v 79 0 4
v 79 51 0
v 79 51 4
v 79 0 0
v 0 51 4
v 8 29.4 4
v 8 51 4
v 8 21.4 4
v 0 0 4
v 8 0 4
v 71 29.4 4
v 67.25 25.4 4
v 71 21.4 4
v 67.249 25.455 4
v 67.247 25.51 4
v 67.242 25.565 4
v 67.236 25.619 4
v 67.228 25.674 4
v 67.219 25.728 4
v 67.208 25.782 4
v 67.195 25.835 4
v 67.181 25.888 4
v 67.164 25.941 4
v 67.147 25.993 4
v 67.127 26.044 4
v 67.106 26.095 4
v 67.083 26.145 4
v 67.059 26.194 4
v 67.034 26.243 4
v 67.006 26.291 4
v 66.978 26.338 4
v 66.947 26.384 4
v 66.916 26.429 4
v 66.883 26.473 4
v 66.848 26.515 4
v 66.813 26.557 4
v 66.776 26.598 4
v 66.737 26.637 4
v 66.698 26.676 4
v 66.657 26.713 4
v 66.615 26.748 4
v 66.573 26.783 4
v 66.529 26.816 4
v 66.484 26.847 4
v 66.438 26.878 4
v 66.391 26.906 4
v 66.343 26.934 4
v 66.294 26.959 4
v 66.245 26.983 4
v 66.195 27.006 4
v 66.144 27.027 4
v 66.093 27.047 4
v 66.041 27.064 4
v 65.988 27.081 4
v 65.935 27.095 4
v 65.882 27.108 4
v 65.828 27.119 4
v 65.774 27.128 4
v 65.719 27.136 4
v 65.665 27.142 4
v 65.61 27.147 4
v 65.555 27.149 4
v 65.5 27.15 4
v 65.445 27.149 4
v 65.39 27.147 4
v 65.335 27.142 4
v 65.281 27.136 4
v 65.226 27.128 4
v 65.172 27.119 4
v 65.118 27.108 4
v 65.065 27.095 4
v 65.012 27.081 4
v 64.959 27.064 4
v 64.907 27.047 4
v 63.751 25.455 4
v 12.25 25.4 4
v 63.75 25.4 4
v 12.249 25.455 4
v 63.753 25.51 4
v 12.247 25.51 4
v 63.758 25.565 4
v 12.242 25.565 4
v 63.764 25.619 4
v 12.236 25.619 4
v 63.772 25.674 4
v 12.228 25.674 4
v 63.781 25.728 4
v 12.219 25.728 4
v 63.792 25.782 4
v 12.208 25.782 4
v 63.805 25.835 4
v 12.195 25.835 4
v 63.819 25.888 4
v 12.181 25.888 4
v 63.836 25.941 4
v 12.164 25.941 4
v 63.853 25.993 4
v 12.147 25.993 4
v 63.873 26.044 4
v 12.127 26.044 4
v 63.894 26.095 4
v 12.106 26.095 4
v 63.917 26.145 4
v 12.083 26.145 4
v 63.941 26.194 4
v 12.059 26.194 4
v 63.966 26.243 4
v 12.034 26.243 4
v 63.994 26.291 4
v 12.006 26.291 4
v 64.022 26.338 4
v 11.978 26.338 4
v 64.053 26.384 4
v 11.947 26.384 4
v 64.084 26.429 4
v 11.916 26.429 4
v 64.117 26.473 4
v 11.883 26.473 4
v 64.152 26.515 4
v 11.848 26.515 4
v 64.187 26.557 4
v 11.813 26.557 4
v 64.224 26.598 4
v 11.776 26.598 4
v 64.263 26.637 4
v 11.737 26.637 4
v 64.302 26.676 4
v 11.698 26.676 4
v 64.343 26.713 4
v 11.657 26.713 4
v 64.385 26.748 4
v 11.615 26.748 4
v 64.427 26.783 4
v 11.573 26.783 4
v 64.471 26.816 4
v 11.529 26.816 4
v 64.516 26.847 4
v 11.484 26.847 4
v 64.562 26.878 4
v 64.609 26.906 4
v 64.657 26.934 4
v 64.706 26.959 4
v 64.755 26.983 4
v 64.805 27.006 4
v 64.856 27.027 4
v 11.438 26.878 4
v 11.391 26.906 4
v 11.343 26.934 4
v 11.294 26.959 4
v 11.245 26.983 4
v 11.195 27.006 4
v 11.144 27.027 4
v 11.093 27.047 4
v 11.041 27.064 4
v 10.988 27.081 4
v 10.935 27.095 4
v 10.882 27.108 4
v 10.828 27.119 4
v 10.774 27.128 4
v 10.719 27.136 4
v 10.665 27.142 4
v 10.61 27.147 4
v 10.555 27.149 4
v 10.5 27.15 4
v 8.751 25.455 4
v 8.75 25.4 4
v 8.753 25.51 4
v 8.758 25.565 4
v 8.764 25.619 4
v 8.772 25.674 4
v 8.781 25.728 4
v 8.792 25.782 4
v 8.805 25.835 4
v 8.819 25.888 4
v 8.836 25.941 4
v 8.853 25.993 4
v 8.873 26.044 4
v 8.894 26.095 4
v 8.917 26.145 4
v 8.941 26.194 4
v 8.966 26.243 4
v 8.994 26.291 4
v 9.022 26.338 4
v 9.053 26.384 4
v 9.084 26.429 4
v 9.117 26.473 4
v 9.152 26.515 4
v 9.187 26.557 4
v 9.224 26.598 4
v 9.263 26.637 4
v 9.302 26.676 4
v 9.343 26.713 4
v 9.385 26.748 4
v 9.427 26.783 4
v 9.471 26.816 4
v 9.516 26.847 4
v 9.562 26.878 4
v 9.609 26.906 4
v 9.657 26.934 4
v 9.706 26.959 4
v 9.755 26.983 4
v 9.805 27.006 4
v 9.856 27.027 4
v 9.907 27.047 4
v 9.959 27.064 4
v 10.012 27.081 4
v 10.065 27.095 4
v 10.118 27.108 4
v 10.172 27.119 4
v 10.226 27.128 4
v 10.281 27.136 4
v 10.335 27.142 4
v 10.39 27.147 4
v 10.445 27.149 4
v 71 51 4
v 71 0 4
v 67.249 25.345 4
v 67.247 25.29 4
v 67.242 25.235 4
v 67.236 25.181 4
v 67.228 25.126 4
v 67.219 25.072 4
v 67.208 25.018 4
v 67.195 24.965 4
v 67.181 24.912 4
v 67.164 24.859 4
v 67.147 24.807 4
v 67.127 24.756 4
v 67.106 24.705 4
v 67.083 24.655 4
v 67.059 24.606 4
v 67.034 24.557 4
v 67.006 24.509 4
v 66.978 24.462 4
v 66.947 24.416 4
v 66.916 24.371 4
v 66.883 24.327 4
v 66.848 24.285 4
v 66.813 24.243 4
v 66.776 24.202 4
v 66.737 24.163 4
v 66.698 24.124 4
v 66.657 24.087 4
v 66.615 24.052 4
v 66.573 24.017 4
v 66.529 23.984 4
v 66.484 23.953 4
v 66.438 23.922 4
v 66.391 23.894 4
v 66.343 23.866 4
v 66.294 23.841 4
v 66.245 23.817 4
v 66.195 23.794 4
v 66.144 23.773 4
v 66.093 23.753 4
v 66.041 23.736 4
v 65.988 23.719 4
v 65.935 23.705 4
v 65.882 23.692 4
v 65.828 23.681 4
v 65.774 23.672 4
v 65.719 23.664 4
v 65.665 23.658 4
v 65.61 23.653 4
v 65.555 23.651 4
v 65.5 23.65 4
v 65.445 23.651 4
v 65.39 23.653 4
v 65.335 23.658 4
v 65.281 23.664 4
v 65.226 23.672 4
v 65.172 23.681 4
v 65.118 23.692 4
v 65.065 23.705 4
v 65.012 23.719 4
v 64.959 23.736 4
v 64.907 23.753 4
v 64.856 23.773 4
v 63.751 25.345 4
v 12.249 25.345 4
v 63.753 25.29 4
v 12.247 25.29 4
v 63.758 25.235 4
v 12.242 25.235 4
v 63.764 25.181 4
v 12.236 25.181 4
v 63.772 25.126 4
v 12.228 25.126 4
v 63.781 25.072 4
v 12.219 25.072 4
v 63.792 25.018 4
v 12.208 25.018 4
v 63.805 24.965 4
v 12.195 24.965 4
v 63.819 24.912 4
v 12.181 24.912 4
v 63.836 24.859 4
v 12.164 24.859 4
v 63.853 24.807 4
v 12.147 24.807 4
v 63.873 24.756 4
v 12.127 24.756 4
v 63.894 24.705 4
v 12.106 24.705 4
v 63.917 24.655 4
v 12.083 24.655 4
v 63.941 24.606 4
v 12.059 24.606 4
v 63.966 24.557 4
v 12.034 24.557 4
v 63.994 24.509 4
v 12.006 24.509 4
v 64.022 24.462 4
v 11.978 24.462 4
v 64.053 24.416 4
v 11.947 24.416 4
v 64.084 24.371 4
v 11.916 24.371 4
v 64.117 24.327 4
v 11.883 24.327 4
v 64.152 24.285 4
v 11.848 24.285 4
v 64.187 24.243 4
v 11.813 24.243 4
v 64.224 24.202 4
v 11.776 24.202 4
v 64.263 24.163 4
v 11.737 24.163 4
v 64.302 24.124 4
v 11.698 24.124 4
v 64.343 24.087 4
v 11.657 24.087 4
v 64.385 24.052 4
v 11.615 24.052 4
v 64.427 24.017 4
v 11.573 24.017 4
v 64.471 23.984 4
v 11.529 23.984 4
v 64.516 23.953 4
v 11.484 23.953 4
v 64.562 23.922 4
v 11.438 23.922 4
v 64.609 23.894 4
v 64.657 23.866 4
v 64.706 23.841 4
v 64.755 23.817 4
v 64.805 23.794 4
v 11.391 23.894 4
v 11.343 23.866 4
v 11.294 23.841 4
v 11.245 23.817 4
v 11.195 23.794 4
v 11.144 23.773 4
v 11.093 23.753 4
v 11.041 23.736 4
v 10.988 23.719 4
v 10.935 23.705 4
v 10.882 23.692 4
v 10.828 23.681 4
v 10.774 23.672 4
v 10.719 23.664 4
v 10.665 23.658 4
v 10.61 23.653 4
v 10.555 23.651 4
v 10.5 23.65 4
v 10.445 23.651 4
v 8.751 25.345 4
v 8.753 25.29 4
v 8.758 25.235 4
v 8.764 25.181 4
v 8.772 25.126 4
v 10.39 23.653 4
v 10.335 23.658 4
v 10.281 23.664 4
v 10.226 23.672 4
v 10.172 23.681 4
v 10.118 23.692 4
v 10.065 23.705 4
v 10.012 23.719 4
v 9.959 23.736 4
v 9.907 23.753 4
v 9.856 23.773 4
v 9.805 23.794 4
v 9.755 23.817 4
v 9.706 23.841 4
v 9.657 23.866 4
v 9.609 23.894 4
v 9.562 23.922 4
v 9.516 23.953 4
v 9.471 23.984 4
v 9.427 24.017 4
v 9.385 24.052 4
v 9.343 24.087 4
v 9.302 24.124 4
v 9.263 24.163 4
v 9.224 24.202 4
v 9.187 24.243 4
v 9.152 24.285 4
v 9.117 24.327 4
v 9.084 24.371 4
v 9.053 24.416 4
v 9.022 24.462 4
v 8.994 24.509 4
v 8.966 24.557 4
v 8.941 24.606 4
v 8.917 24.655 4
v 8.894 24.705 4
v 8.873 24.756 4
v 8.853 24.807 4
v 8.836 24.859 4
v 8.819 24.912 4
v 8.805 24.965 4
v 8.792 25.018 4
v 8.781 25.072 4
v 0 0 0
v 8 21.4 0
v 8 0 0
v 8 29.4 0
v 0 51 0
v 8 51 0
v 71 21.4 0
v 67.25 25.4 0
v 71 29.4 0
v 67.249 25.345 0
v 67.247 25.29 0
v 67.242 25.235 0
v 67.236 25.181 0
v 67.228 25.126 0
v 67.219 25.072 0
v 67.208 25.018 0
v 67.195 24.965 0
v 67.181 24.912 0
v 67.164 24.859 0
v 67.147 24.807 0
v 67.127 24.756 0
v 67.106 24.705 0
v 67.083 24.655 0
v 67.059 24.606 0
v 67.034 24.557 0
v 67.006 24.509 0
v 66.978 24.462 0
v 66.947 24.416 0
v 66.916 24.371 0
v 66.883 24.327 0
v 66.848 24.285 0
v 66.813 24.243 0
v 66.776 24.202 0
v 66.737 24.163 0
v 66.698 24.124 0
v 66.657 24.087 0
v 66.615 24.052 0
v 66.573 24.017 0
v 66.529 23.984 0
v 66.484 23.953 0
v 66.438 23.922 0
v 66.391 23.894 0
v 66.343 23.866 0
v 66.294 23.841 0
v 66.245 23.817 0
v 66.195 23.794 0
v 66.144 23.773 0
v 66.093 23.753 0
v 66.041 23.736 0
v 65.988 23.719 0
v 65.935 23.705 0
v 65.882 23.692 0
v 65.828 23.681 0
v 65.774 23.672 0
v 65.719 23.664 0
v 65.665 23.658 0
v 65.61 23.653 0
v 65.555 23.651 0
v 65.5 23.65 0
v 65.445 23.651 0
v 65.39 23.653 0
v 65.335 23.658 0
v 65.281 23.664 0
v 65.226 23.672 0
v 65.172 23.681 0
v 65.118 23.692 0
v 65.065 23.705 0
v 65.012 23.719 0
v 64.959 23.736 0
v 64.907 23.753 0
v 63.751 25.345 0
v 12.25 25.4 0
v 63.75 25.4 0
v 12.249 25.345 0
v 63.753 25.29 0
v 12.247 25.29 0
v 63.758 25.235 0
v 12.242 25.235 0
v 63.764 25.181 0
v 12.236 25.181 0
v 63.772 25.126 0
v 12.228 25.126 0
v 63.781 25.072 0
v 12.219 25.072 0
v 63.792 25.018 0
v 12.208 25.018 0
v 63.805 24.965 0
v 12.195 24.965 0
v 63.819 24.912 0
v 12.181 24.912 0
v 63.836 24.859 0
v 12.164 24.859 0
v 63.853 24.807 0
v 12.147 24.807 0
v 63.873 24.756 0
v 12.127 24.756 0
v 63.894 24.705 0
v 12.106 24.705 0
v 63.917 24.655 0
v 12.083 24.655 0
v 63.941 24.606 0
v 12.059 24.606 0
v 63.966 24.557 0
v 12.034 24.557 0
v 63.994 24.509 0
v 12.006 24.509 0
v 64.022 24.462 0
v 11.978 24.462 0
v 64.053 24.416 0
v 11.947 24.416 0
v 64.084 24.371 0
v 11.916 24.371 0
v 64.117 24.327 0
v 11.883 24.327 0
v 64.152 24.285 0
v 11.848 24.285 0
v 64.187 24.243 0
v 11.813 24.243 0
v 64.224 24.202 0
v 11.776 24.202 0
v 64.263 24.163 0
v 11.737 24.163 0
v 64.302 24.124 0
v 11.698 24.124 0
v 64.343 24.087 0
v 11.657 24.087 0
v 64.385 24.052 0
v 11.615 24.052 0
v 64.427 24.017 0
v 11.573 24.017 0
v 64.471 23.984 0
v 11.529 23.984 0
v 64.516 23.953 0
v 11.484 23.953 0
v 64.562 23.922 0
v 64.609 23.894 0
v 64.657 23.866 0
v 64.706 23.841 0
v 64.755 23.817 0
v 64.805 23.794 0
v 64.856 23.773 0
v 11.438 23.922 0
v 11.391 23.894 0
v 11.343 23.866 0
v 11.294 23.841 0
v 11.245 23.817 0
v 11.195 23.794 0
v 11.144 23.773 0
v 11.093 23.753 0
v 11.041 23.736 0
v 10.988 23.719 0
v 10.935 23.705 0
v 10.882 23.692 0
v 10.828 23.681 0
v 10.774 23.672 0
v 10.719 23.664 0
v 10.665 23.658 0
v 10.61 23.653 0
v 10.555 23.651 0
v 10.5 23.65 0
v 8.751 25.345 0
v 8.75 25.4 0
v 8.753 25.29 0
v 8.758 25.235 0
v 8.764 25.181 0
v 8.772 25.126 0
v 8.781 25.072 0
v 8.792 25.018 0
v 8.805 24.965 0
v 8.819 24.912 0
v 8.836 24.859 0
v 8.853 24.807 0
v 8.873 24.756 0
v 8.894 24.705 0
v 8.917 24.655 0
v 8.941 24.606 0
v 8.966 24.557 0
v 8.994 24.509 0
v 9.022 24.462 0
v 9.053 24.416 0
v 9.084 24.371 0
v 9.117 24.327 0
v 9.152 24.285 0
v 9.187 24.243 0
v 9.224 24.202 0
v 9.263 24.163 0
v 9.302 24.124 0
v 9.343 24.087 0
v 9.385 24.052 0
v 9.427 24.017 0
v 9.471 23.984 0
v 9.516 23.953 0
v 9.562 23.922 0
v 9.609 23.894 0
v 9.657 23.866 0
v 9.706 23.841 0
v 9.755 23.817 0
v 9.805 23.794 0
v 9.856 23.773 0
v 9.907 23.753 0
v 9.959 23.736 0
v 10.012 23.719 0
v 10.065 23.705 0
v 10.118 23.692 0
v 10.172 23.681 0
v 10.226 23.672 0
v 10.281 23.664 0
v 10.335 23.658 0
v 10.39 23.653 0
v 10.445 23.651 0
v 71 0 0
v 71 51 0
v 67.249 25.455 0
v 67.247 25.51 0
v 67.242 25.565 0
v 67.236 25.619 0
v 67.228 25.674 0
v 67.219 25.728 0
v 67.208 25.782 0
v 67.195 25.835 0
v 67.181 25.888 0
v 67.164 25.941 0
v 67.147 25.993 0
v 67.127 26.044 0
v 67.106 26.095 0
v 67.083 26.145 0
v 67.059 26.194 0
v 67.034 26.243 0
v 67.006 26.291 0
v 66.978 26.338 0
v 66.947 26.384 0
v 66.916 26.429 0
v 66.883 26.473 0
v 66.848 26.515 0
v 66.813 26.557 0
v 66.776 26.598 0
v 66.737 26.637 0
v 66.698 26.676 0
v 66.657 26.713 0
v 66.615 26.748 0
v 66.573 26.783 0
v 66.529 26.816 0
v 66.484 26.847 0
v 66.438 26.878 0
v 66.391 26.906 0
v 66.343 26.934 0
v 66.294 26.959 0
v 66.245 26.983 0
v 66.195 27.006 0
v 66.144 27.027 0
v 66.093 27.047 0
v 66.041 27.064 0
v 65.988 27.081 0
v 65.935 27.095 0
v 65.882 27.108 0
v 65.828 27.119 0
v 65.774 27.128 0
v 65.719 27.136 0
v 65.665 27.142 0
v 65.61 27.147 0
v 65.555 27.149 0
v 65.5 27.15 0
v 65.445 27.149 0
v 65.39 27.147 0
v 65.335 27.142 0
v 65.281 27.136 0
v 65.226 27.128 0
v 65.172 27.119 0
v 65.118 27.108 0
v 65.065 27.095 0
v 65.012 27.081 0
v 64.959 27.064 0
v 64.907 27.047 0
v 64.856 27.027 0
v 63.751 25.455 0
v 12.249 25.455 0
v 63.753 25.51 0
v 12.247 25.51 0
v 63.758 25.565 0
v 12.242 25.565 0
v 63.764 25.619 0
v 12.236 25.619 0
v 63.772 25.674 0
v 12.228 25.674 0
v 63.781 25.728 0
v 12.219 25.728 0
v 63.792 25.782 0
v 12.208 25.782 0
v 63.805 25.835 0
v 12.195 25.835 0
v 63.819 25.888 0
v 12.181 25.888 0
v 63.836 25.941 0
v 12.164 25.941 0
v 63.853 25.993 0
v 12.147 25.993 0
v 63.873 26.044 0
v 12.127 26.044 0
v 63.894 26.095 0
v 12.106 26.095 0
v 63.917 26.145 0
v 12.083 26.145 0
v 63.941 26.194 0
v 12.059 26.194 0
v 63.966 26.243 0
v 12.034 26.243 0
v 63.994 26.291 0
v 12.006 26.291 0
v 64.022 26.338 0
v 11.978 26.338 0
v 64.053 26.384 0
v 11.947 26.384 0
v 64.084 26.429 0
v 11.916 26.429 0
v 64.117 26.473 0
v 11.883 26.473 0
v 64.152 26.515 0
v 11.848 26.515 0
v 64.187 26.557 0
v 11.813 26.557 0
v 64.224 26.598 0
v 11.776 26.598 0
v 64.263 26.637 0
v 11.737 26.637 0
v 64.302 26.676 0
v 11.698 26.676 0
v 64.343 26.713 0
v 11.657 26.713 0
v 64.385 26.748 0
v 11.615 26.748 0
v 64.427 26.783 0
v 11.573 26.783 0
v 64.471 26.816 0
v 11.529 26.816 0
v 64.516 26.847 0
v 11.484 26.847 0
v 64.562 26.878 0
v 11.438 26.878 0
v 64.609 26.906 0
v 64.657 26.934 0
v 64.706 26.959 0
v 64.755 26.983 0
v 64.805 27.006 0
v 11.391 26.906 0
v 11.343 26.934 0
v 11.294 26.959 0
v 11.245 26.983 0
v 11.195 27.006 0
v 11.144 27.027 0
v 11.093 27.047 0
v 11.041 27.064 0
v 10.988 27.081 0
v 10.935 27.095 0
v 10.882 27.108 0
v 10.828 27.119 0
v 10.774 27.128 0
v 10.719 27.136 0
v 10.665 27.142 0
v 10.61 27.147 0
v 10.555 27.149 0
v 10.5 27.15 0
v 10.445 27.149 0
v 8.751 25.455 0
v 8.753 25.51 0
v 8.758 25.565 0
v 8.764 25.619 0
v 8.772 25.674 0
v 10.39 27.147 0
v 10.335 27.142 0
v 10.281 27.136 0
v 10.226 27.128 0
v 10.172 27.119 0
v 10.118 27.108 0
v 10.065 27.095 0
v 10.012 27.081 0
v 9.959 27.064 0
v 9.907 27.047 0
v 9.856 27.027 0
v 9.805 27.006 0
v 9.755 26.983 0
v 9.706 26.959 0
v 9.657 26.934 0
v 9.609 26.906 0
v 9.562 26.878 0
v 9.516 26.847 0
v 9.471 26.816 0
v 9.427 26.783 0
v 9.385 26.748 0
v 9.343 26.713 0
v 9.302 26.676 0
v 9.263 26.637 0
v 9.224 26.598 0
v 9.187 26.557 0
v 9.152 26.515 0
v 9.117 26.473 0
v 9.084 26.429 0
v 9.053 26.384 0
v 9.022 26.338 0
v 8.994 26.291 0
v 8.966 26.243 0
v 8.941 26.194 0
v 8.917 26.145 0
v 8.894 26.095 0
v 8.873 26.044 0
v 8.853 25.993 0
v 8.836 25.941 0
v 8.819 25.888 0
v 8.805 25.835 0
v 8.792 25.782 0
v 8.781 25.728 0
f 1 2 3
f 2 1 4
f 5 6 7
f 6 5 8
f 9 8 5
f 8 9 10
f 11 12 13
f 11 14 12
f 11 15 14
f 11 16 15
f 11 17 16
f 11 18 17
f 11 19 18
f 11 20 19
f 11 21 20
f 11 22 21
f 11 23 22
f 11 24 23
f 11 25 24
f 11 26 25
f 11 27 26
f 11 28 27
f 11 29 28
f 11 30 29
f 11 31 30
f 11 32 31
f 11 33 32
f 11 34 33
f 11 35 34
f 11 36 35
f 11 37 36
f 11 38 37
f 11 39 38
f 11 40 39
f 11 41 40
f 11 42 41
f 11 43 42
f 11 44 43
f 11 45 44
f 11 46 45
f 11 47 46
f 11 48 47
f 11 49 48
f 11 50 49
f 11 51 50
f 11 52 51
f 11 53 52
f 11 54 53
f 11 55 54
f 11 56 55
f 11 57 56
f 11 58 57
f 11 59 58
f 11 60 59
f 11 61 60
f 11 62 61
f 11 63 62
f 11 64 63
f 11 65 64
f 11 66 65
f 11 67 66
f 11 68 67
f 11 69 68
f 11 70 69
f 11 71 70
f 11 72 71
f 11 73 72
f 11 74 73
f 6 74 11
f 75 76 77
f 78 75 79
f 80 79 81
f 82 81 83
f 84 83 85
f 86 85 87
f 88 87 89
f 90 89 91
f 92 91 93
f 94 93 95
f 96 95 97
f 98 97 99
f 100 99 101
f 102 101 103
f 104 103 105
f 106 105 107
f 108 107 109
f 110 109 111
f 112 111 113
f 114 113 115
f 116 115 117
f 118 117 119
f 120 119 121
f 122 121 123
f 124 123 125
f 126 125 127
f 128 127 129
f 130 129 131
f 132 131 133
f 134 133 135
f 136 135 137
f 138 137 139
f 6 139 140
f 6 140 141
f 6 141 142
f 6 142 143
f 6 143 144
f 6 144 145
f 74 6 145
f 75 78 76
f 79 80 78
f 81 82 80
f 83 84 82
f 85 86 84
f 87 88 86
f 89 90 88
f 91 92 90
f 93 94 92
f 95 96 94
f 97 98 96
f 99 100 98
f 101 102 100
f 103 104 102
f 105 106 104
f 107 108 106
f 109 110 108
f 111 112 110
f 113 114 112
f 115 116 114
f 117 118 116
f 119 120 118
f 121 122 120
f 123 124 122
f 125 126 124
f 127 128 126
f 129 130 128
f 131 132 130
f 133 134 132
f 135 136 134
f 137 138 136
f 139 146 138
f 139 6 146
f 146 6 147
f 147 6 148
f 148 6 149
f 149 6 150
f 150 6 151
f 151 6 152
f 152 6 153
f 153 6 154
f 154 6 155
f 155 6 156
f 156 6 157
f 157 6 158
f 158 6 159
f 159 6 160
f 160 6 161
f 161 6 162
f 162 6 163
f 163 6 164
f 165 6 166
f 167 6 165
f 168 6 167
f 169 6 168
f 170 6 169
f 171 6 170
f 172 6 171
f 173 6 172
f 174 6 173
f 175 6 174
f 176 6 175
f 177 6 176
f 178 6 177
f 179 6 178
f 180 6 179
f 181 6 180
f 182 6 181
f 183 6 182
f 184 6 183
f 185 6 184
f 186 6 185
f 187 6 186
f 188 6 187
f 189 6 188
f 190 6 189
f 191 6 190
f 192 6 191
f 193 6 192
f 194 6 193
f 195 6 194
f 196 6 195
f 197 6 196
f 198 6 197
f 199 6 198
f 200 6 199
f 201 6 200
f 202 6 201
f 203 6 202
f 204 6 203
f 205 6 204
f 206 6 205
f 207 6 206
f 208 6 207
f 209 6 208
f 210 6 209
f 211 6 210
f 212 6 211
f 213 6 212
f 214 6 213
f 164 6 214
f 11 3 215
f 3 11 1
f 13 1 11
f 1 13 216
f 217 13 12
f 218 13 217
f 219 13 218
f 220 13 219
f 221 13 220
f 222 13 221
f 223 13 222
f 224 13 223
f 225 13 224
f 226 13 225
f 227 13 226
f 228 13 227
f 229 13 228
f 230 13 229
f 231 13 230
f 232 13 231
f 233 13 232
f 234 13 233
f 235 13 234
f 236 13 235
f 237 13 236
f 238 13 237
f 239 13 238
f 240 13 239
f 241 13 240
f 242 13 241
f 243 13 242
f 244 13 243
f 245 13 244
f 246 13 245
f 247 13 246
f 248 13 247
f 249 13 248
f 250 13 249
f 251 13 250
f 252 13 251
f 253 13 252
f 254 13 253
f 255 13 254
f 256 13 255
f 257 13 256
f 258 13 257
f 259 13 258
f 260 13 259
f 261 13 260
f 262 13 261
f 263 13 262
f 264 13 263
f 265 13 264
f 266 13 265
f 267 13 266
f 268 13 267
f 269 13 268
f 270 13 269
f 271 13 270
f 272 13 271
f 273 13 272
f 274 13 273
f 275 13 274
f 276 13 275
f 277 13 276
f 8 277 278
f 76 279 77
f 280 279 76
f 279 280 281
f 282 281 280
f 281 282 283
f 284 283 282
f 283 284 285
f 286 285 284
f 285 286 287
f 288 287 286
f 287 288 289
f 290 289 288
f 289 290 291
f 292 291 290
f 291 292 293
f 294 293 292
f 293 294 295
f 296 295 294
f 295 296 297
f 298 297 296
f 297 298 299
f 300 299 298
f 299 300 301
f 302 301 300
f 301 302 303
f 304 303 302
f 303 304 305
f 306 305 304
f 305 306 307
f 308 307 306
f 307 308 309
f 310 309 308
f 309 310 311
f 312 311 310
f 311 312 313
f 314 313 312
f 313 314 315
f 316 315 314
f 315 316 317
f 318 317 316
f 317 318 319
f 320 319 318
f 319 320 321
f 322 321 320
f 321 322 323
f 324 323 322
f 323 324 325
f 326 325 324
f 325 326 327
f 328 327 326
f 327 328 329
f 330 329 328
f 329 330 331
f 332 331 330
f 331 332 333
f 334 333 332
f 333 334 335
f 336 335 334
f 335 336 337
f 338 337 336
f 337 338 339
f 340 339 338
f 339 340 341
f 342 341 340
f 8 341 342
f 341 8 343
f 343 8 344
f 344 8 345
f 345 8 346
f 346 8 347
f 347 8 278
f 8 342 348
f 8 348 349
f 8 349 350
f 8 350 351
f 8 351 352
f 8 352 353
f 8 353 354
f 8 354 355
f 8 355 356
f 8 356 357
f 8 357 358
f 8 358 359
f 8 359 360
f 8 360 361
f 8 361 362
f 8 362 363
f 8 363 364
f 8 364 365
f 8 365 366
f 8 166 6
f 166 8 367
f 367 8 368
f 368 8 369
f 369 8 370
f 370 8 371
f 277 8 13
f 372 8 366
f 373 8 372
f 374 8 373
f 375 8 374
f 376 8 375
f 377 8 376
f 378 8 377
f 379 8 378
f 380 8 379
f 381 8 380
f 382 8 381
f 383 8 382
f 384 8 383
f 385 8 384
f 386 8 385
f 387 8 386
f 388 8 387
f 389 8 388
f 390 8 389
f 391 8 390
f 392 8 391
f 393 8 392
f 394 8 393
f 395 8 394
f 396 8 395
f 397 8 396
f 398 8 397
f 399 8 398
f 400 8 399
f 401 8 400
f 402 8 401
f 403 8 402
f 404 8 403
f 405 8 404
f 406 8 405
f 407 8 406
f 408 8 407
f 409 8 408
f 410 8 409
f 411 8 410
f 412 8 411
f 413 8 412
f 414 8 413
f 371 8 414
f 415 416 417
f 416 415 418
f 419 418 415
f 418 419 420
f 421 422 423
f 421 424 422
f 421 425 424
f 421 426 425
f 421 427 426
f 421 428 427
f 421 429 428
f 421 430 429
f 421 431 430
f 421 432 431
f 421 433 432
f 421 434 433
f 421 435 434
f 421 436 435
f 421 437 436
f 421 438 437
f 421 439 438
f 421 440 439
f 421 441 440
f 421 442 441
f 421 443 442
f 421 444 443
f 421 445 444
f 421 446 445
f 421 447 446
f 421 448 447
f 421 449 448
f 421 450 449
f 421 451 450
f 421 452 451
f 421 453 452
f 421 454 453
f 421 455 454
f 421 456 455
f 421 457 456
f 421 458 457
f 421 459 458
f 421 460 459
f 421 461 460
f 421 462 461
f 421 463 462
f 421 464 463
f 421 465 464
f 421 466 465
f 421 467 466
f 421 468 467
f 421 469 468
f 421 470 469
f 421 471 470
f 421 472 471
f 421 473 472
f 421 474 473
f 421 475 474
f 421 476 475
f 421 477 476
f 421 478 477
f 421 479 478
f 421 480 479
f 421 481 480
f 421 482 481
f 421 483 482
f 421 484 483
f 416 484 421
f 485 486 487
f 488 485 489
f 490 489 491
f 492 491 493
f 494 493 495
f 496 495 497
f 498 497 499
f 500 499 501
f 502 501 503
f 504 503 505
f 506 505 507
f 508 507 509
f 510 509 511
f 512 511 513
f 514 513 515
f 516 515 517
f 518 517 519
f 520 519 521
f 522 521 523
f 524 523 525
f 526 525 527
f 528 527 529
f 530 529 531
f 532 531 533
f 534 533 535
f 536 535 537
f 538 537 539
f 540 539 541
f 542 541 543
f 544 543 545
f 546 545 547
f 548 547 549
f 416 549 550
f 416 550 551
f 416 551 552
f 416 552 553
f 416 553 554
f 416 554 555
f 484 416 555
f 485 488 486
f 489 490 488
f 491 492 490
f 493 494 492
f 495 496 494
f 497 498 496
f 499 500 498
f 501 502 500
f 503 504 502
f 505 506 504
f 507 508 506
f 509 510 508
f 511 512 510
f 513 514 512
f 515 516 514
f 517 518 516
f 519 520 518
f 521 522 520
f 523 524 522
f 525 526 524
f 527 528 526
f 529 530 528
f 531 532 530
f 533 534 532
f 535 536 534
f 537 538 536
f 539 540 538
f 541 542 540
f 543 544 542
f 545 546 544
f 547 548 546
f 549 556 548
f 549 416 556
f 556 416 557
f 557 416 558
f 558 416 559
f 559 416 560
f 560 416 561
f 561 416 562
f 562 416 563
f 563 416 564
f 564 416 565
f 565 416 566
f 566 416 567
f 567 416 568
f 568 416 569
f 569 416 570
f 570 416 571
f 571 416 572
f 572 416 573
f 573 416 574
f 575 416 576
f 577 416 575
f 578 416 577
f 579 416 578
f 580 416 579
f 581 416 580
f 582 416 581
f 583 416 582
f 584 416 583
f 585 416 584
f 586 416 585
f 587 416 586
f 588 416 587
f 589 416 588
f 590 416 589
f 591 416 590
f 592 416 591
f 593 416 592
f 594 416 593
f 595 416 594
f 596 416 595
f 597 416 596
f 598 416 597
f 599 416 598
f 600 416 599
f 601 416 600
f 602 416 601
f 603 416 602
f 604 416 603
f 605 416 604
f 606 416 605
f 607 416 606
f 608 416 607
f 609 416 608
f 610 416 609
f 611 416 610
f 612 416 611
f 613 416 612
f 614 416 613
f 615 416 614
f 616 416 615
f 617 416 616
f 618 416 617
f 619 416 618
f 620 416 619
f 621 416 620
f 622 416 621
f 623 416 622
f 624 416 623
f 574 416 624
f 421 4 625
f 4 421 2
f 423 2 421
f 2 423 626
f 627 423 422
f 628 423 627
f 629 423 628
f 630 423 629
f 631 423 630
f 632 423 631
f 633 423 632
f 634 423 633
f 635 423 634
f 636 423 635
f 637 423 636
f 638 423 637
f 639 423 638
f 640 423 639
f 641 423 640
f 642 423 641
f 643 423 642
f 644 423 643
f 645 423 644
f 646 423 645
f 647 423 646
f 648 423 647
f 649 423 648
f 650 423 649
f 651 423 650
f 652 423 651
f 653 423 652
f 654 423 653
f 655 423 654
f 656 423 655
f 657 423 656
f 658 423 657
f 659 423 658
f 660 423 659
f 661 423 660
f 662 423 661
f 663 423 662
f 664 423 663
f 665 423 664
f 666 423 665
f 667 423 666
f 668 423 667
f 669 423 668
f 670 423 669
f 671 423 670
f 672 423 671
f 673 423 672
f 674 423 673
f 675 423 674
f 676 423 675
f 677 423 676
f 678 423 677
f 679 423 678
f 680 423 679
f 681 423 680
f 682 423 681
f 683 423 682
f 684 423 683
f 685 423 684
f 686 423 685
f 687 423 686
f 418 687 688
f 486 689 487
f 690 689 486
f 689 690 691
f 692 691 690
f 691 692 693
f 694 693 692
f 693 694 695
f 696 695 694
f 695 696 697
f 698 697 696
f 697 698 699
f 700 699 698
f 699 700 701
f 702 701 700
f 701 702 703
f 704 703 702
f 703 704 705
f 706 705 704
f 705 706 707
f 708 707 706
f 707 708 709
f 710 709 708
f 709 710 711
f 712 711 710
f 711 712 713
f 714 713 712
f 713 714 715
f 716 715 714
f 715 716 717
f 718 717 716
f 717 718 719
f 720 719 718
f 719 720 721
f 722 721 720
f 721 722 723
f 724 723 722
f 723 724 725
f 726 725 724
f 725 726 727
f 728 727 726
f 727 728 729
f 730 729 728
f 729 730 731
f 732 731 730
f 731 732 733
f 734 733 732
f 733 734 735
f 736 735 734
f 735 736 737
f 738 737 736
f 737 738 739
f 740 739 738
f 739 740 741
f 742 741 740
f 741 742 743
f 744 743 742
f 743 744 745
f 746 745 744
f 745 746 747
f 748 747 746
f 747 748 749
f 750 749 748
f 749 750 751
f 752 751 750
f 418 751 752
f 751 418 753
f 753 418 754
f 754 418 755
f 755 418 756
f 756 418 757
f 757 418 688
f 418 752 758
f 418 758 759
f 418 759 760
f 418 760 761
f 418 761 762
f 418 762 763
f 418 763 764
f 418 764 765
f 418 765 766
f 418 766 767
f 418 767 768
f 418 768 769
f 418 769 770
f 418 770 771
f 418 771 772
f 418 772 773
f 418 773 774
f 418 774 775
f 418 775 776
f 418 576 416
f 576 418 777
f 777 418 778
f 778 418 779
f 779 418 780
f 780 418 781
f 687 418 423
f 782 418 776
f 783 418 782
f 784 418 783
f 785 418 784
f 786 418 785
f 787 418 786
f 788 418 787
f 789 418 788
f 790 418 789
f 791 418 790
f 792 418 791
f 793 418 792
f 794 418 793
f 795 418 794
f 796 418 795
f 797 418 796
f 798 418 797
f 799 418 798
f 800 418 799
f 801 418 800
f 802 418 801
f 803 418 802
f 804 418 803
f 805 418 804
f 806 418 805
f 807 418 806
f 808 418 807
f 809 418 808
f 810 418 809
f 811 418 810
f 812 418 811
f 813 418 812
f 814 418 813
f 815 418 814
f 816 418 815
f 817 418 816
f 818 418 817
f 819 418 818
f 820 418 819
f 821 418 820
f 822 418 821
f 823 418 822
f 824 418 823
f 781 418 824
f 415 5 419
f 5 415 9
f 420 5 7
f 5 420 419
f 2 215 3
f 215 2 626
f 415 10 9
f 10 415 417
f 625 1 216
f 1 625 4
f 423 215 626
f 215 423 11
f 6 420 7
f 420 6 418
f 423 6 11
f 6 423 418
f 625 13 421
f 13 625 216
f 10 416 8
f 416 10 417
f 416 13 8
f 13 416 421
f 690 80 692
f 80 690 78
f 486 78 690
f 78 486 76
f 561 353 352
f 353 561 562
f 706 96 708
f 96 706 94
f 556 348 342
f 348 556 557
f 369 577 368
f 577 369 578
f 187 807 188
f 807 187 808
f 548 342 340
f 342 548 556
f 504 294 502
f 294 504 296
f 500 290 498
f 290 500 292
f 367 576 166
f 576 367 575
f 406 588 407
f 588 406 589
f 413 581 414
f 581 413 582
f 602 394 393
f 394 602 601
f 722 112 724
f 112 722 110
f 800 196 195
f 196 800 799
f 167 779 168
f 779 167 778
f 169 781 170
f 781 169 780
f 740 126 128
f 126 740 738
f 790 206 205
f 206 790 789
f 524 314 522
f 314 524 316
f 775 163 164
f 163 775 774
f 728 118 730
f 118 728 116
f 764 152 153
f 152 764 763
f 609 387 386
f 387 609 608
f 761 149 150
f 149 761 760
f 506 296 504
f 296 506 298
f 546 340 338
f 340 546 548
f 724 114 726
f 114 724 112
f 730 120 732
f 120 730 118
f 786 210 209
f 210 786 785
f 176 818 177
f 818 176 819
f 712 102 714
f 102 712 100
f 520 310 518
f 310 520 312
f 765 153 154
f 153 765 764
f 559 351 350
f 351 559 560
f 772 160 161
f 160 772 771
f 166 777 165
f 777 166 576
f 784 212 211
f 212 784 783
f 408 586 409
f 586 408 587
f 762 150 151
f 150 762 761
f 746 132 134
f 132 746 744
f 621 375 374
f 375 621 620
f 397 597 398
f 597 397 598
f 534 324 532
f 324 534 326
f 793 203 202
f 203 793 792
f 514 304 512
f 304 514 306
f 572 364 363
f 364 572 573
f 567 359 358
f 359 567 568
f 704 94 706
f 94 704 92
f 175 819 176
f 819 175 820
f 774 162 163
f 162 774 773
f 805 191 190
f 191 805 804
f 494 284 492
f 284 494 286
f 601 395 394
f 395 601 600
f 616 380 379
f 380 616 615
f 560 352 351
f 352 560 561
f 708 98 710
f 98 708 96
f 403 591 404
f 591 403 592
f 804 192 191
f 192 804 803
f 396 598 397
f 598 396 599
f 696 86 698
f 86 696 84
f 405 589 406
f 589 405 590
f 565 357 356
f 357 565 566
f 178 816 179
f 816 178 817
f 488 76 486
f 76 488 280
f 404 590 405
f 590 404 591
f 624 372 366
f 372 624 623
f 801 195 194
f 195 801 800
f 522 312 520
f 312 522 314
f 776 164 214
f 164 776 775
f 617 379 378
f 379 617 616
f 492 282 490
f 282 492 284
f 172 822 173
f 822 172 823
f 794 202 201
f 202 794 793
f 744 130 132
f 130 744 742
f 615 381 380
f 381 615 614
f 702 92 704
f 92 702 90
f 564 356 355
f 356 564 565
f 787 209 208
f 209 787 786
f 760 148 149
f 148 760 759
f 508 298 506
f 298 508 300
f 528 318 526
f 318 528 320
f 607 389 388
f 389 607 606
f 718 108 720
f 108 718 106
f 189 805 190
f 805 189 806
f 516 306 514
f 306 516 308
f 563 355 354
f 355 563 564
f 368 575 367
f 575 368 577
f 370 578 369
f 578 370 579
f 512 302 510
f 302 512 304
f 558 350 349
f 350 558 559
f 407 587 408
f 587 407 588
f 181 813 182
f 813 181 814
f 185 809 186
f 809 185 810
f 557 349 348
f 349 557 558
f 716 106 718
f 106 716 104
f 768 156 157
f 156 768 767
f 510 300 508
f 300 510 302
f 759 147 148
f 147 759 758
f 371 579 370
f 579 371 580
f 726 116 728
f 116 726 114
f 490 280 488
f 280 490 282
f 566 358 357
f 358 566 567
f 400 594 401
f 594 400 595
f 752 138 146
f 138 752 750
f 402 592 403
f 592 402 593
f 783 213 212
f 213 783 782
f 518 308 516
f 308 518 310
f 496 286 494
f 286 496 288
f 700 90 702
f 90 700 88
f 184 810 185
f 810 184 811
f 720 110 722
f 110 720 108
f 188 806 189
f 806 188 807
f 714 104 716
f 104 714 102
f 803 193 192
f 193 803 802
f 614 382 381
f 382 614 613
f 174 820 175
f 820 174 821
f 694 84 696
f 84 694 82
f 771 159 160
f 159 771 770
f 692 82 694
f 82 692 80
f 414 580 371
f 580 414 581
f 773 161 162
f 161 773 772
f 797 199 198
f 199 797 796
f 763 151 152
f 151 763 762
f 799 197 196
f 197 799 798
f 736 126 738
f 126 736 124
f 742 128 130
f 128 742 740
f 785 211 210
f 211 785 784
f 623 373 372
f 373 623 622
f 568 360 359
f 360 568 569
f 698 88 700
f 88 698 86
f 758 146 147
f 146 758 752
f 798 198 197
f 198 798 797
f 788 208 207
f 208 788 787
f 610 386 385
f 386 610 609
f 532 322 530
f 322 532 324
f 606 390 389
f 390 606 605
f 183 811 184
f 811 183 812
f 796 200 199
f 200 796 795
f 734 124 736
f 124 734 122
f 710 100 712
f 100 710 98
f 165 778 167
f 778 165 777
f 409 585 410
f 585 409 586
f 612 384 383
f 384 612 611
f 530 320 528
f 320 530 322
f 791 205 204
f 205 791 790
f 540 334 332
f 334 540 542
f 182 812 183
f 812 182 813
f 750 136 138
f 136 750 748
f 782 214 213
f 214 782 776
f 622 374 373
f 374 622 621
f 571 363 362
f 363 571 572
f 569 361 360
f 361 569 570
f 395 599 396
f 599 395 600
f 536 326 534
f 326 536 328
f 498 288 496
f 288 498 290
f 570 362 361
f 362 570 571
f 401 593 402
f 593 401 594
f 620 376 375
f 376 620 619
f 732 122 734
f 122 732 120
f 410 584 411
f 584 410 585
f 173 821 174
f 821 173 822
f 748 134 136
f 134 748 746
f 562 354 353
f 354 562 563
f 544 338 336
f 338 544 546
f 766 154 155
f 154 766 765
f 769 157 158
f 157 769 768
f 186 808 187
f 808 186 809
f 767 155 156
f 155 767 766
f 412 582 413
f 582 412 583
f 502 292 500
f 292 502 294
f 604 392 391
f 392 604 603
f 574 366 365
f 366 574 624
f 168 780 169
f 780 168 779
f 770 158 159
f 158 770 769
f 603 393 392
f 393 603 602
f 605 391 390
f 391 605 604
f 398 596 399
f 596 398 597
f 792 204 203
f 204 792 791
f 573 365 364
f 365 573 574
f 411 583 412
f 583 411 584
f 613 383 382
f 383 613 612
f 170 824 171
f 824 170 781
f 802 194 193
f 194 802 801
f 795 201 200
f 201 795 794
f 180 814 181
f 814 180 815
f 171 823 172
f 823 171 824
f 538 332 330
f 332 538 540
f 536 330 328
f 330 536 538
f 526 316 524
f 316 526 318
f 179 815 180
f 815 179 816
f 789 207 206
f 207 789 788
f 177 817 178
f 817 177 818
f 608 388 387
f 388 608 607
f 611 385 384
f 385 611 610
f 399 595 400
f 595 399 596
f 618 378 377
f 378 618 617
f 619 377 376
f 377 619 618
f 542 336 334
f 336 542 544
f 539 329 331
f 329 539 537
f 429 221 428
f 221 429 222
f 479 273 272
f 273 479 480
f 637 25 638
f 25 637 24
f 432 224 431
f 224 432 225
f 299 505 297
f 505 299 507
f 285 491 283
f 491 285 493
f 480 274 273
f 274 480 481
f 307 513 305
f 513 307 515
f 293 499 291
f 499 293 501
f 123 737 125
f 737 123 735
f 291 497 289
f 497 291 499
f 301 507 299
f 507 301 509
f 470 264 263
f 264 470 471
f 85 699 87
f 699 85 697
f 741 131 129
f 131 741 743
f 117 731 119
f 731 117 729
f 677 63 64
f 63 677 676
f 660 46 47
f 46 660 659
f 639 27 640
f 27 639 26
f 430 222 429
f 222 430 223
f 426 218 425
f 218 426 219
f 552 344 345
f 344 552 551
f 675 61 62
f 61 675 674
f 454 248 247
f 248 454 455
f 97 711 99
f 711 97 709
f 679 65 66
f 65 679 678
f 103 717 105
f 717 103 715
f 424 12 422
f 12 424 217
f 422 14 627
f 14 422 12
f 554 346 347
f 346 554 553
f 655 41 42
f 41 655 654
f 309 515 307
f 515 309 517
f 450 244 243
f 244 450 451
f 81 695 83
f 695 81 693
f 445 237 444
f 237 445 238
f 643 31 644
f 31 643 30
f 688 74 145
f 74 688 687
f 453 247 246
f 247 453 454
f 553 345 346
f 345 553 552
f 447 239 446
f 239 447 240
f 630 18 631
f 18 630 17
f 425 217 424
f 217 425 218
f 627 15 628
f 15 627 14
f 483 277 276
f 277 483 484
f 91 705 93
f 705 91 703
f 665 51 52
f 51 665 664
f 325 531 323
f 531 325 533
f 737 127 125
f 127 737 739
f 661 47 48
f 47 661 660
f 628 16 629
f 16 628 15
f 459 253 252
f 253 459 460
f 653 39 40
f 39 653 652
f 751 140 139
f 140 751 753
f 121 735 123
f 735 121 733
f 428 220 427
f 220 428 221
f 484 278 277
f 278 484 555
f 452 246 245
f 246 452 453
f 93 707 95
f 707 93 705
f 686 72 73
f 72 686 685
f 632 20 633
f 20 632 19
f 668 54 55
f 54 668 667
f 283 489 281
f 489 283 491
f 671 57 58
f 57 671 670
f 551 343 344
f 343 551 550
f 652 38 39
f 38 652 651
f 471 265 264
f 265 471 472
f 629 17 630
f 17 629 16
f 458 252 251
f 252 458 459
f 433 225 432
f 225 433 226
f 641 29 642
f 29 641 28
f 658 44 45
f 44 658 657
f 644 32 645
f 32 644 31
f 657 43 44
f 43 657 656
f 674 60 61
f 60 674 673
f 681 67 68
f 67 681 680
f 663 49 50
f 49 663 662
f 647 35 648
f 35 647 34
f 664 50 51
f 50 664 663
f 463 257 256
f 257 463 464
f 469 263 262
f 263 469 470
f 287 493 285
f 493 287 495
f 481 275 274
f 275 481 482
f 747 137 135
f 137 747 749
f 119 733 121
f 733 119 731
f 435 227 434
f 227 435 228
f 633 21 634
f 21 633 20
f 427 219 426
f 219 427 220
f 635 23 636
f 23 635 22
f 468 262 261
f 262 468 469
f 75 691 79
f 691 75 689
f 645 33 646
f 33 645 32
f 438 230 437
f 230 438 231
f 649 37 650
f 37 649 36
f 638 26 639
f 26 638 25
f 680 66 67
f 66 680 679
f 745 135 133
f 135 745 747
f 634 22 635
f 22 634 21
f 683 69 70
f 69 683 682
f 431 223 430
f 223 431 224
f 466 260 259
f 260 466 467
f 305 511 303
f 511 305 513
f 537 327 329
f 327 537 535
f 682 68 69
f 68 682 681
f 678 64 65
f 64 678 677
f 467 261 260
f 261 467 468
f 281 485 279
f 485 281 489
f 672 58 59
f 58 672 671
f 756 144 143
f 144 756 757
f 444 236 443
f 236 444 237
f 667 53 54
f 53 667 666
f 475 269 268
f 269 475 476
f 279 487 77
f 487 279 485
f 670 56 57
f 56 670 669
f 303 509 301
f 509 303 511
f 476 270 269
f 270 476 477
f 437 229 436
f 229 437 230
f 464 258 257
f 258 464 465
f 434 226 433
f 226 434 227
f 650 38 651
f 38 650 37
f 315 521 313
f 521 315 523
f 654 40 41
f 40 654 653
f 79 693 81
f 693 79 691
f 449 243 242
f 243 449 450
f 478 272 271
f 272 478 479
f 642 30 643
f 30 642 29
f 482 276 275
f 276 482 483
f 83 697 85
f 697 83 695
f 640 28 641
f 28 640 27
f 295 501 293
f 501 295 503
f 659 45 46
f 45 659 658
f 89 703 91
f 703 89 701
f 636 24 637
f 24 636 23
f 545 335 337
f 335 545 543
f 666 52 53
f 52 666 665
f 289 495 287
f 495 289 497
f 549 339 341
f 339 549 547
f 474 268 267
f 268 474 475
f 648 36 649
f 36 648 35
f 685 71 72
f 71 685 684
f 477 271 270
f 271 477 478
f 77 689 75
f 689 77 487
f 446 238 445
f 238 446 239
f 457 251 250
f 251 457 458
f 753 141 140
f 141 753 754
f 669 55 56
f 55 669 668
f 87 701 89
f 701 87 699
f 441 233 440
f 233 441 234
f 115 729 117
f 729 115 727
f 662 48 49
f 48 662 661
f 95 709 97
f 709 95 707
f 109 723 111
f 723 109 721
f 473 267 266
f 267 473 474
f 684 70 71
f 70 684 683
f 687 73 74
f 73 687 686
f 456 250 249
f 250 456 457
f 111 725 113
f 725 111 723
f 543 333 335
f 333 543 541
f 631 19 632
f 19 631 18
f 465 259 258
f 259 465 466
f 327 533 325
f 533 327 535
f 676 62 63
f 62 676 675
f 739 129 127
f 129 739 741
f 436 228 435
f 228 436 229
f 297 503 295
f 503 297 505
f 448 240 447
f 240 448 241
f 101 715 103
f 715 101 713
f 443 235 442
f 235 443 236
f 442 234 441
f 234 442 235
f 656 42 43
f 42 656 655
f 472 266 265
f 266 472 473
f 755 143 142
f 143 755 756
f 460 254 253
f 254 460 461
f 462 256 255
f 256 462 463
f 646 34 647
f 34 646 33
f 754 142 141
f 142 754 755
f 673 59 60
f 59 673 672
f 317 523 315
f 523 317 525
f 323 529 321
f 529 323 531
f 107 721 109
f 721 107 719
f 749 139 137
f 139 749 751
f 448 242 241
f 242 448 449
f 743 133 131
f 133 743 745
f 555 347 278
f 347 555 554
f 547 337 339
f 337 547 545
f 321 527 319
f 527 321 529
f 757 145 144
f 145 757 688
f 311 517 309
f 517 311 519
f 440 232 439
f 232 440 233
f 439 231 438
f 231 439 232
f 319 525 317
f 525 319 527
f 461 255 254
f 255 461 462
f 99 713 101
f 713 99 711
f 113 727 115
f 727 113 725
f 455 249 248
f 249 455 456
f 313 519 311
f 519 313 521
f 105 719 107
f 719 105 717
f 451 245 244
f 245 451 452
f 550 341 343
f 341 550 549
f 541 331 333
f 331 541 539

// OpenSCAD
$fn = 200;

difference() {
    cube([79, 51, 4]);
    translate([8, 29.4, -1]) cube([63, 40, 10]);
    translate([8, -18.6, -1]) cube([63, 40, 10]);
    translate([10.5, 25.4, -1]) cylinder(h=10, d=3.5);
    translate([65.5, 25.4, -1]) cylinder(h=10, d=3.5);
}
